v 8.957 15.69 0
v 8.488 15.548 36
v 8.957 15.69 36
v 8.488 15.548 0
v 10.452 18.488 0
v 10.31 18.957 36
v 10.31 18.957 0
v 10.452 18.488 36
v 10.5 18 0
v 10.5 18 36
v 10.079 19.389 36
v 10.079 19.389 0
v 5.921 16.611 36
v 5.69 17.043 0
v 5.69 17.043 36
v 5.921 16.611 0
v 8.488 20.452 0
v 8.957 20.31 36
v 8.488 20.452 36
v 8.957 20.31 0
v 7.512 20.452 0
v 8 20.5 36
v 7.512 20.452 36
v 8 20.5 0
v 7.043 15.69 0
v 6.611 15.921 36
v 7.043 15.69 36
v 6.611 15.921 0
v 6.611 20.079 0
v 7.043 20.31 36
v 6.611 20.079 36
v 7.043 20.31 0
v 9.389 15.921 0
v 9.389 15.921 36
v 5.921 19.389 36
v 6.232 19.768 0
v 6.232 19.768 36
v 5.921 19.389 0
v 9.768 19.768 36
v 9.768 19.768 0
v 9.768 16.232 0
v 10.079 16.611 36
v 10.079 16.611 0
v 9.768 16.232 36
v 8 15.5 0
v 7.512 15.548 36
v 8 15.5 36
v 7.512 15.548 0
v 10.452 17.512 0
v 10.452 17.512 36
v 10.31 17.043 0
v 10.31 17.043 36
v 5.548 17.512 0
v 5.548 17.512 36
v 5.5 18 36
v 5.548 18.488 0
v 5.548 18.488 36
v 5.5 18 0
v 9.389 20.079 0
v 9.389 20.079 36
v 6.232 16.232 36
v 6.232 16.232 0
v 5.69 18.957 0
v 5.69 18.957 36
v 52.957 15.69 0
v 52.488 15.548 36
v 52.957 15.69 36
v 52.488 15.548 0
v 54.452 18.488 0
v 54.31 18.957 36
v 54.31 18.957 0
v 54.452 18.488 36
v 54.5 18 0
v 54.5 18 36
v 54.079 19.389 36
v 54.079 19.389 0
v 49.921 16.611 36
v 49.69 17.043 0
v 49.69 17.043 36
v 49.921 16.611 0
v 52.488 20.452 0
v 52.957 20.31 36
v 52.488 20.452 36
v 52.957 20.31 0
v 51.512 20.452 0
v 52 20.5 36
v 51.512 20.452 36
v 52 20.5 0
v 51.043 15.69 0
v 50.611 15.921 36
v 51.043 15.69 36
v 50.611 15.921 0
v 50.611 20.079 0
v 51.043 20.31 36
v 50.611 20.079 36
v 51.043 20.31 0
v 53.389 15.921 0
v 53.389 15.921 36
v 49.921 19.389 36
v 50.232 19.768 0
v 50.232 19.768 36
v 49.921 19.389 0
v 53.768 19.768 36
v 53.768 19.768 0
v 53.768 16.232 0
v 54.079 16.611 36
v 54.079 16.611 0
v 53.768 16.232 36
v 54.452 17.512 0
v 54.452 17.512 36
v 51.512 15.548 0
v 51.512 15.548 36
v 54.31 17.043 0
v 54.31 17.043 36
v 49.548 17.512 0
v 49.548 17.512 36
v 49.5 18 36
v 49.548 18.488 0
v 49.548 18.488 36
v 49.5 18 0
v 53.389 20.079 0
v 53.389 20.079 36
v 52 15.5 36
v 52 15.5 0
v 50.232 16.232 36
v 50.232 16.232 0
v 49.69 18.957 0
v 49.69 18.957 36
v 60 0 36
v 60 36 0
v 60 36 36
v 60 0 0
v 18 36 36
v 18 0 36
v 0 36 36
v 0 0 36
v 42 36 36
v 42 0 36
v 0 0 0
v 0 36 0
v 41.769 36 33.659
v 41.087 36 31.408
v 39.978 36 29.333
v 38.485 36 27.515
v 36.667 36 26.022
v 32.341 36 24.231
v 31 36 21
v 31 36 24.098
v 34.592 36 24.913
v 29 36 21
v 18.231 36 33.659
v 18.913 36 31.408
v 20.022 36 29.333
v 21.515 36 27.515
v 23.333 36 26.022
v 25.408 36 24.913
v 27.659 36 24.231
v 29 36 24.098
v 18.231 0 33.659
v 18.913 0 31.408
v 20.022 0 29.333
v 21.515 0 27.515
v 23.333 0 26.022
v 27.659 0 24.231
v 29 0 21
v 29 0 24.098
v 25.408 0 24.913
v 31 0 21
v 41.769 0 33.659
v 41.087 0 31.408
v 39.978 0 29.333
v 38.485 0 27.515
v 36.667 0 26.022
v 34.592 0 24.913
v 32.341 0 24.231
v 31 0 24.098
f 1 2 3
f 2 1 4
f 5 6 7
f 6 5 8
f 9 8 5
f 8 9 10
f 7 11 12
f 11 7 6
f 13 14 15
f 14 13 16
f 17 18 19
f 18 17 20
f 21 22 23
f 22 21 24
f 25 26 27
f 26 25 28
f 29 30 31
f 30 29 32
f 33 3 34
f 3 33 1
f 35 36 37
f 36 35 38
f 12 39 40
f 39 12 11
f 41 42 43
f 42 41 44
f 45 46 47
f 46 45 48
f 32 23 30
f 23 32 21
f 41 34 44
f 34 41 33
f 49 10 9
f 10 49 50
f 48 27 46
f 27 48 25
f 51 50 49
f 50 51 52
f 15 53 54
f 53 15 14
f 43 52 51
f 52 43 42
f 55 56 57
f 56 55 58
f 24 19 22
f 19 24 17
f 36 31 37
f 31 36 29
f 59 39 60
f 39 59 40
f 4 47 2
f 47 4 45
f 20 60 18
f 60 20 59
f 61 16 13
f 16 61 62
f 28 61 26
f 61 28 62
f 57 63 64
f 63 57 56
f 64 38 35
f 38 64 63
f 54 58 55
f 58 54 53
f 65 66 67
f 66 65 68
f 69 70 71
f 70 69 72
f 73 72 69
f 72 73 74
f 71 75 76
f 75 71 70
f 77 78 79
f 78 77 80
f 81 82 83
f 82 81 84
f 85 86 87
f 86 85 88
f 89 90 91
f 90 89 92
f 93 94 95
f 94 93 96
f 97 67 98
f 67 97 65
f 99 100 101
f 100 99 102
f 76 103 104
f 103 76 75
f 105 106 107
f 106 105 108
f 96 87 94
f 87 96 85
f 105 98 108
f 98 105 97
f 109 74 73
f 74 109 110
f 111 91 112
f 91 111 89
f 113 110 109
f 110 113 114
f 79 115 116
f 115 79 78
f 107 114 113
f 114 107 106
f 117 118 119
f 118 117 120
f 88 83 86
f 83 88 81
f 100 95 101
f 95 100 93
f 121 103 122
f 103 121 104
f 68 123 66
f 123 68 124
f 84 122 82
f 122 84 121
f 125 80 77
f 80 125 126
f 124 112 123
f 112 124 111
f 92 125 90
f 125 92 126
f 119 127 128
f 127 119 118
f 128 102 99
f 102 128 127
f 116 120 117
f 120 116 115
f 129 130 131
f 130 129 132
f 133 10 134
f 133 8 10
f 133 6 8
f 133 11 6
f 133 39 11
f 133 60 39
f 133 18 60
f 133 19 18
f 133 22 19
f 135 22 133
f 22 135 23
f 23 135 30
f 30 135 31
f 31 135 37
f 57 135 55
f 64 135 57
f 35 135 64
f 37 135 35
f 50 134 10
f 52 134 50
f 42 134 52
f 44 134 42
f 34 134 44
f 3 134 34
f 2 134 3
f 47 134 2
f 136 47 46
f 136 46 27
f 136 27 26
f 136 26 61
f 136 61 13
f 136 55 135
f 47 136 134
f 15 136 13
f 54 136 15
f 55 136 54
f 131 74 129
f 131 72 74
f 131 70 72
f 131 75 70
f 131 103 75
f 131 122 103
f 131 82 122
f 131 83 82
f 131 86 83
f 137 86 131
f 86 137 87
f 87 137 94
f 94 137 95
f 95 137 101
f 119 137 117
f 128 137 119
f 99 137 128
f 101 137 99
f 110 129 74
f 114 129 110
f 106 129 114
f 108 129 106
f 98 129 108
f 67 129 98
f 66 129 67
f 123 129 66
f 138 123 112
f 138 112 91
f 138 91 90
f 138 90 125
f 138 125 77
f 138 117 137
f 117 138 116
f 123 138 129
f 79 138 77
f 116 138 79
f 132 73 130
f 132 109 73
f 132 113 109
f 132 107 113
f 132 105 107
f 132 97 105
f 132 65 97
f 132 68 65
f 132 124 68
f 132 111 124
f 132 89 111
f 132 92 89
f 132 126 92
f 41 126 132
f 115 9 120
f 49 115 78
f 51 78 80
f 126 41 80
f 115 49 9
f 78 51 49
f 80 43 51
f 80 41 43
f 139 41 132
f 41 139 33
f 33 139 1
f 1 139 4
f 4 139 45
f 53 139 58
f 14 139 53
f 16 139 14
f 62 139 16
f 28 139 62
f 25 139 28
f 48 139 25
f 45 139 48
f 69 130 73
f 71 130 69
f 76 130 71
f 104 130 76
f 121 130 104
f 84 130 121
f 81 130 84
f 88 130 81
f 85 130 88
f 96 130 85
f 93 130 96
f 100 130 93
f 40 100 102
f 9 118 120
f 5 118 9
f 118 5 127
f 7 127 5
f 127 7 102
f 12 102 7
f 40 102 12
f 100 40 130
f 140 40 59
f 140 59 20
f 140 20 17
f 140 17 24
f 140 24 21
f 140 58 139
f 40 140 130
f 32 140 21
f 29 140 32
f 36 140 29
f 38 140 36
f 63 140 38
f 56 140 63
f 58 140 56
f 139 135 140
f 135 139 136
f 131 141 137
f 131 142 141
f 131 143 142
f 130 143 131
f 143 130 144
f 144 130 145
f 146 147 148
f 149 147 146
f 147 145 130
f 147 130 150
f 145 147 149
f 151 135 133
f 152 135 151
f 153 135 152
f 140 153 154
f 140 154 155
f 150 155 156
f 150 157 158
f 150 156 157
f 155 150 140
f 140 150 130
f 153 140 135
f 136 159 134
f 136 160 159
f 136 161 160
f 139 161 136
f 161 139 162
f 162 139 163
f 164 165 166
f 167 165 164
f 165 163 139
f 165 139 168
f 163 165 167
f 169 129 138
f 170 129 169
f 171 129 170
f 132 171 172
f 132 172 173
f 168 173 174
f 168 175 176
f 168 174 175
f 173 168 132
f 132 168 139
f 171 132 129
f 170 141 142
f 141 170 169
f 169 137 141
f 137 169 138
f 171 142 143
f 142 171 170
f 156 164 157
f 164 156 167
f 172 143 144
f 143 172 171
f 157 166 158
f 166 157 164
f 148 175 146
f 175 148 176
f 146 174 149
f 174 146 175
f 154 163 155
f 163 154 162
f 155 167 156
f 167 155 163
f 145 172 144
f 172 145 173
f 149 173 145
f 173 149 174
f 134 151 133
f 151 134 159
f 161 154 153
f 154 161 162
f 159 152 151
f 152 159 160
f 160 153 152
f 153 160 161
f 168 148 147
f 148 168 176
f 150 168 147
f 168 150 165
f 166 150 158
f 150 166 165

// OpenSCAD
$fn = 32;

// ----------------------------------------------------------------------
// Saddle clamp: split shaft clamp
// ----------------------------------------------------------------------

// --- parameters (mm) ---
blk_l = 60;               // block length, X
blk_w = 36;               // block width, Y
blk_h = 36;               // block height
clamp_r = 12;             // shaft groove radius
hole_r = 2.5;             // bolt hole radius
hole_m = 8;               // bolt hole margin from the ends
saw_w = 2;                // saw kerf width

saw_depth = clamp_r + 3;  // saw kerf depth

difference() {
  cube([blk_l, blk_w, blk_h]);
  translate([blk_l / 2, -1, blk_h])
    rotate([-90, 0, 0])
      cylinder(h = blk_w + 2, r = clamp_r);
  for (sx = [0, 1])
    translate([sx ? blk_l - hole_m : hole_m, blk_w / 2, -1])
      cylinder(r = hole_r, h = blk_h + 2);
  translate([blk_l / 2 - saw_w / 2, -1, blk_h - saw_depth])
    cube([saw_w, blk_w + 2, saw_depth + 1]);
}
